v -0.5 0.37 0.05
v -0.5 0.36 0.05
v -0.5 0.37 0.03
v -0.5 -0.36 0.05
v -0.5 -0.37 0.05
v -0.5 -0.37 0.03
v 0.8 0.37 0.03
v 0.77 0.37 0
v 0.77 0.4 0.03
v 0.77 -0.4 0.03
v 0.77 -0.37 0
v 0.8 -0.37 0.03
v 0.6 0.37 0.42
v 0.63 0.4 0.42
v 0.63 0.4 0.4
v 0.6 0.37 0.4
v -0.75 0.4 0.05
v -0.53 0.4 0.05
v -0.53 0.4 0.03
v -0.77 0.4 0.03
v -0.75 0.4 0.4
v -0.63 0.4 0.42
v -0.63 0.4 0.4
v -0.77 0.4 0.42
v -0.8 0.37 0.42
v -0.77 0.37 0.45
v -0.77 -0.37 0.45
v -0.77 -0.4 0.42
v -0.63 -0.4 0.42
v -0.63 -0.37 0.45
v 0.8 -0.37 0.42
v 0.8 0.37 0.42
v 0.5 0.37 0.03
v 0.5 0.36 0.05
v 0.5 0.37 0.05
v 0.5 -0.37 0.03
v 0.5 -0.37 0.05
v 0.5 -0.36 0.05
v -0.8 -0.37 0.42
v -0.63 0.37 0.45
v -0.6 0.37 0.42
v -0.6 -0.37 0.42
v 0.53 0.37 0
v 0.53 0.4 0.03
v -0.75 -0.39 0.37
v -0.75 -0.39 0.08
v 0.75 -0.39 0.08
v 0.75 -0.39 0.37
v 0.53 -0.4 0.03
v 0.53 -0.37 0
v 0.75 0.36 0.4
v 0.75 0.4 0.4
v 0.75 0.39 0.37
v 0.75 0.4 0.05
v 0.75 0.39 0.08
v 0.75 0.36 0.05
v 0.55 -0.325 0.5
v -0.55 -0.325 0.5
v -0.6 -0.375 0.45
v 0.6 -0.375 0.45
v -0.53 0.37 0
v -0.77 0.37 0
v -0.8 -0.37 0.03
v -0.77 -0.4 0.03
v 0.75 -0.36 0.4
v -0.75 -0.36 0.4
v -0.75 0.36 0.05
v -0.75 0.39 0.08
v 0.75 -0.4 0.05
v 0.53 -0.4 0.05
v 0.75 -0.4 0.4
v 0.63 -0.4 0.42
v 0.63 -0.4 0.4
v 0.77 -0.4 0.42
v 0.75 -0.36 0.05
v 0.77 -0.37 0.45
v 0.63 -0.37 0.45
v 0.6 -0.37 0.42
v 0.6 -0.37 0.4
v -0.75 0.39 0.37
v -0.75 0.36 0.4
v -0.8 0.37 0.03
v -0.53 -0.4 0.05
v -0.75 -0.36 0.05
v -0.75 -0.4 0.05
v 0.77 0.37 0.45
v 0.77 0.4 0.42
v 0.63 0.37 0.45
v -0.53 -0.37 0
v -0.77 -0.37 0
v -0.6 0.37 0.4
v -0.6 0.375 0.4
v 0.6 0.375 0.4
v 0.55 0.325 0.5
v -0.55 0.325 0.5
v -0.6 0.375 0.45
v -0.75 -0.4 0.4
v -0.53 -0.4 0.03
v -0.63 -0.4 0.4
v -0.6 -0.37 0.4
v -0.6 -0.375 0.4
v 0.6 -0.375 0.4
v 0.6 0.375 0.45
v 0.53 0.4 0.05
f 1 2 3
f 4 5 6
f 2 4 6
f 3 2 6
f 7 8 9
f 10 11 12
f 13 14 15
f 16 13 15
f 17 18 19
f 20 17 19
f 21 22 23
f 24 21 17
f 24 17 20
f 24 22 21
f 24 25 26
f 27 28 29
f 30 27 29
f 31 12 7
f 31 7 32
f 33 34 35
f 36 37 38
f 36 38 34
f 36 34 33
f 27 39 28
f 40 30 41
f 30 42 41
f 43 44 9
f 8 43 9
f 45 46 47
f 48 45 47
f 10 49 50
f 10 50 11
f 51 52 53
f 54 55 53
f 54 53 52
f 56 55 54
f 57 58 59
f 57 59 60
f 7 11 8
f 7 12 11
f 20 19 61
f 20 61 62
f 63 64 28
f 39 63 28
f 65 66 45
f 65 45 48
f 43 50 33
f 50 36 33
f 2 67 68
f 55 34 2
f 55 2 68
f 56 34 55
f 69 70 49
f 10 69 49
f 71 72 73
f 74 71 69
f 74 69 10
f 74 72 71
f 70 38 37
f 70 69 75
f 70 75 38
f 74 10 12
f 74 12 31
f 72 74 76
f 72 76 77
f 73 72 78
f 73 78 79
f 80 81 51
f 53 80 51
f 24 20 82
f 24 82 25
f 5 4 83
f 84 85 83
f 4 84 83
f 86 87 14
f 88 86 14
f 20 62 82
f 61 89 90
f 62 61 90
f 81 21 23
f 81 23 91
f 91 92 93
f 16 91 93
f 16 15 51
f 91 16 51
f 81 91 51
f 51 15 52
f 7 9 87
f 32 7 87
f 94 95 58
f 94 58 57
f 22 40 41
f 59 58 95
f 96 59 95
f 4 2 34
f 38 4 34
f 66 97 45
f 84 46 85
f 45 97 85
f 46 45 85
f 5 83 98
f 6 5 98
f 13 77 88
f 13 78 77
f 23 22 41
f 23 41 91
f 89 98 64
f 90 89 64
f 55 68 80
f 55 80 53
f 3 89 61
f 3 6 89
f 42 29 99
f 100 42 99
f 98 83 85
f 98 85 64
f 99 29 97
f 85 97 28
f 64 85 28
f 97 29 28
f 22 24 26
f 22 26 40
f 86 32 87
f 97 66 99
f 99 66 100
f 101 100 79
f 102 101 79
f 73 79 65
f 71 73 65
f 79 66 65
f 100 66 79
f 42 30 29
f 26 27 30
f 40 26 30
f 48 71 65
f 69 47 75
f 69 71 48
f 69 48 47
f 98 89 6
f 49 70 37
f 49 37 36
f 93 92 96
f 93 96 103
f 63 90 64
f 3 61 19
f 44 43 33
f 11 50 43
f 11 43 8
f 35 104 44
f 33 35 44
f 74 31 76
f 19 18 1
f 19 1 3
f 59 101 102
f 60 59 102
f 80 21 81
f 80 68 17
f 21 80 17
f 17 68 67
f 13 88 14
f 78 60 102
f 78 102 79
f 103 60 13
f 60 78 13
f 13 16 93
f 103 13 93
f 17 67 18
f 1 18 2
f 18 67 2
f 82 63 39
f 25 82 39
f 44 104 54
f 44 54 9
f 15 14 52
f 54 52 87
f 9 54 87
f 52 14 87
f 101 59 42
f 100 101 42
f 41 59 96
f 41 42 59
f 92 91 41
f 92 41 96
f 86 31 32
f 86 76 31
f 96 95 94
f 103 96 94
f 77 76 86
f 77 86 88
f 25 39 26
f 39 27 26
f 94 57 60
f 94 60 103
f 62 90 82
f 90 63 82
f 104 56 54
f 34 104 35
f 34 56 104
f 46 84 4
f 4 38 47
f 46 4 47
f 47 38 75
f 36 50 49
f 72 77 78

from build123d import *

# Parameters (mm, degrees)
BOX_W                          = 1.5
BOX_H                          = 0.78
BOX_DEPTH                      = 0.35
CHAMFER_SIZE                   = 0.03
BOX001_W                       = 1.2
BOX001_H                       = 0.75
BOX001_DEPTH                   = 0.1
CHAMFER002_SIZE                = 0.05
EXTRUDE_DEPTH                  = 0.8
EXTRUDE_ONTO_SKETCH_ROLL_ANGLE = 90
CHAMFER001_SIZE                = 0.03


with BuildPart() as chamferbody:
    # Box → Box (new body)
    with BuildSketch(Plane(origin=(-0.75, 0.01, 0.05), x_dir=(1, 0, 0), z_dir=(0, 0, 1))):
        with Locations((0.75, 0.39)):
            Rectangle(BOX_W, BOX_H)
    extrude(amount=BOX_DEPTH)

    # Chamfer
    chamfer_edges = [chamferbody.edges().sort_by_distance(p)[0] for p in [
        (0, 0.01, 0.05),
        (0, 0.01, 0.4),
        (0, 0.79, 0.05),
        (0, 0.79, 0.4),
    ]]
    chamfer(chamfer_edges, length=CHAMFER_SIZE)


with BuildPart() as chamfer002:
    # Box001 → Box001 (new body)
    with BuildSketch(Plane(origin=(-0.6, 0.025, 0.4), x_dir=(1, 0, 0), z_dir=(0, 0, 1))):
        with Locations((0.6, 0.375)):
            Rectangle(BOX001_W, BOX001_H)
    extrude(amount=BOX001_DEPTH)

    # Chamfer002
    chamfer002_edges = [chamfer002.edges().sort_by_distance(p)[0] for p in [
        (-0.6, 0.4, 0.5),
        (0.6, 0.4, 0.5),
        (0, 0.025, 0.5),
        (0, 0.775, 0.5),
    ]]
    chamfer(chamfer002_edges, length=CHAMFER002_SIZE)


with BuildPart() as chamferpads:
    # Sketch as drawn → Extrude (new)
    with BuildSketch(Plane.XY):
        Polygon((-0.5, 0), (-0.8, 0), (-0.8, 0.45), (-0.6, 0.45), (-0.6, 0.4), (-0.75, 0.4), (-0.75, 0.05), (-0.5, 0.05), align=None)
    extrude(amount=-EXTRUDE_DEPTH)


with BuildPart() as chamferpads_1:
    # Extrude onto Sketch roll: moved
    add(chamferpads.part.rotate(Axis((0, 0, 0), (1, 0, 0)), EXTRUDE_ONTO_SKETCH_ROLL_ANGLE))


with BuildPart() as chamferpads_2:
    # Extrude onto Sketch placement: moved
    add(chamferpads_1.part)

    # Chamfer001
    chamfer001_edges = [chamferpads_2.edges().sort_by_distance(p)[0] for p in [
        (-0.5, 0.4, 0),
        (-0.8, 0.4, 0),
        (-0.65, 0, 0),
        (-0.65, 0.8, 0),
        (-0.8, 0.4, 0.45),
        (-0.8, 0, 0.225),
        (-0.8, 0.8, 0.225),
        (-0.6, 0.4, 0.45),
        (-0.7, 0, 0.45),
        (-0.7, 0.8, 0.45),
        (-0.6, 0, 0.425),
        (-0.6, 0.8, 0.425),
        (-0.5, 0, 0.025),
        (-0.5, 0.8, 0.025),
    ]]
    chamfer(chamfer001_edges, length=CHAMFER001_SIZE)


with BuildPart() as part_mirroring:
    # Part__Mirroring: instance of ChamferPads
    add(chamferpads_2.part.mirror(Plane(origin=(0, 0, 0), x_dir=(0, -1, 0), z_dir=(1, 0, 0))))


with BuildPart() as fusion001:
    # Fusion base: copy of ChamferPads
    add(chamferpads_2.part)

    # Fusion: union Part__Mirroring
    add(part_mirroring.part)

    # Fusion001: union ChamferBody, Chamfer002
    add(chamferbody.part)
    add(chamfer002.part)


with BuildPart() as fusion001_1:
    # Fusion001 placement: moved
    add(fusion001.part.moved(Location((0, -0.4, 0))))


solid = fusion001_1.part
